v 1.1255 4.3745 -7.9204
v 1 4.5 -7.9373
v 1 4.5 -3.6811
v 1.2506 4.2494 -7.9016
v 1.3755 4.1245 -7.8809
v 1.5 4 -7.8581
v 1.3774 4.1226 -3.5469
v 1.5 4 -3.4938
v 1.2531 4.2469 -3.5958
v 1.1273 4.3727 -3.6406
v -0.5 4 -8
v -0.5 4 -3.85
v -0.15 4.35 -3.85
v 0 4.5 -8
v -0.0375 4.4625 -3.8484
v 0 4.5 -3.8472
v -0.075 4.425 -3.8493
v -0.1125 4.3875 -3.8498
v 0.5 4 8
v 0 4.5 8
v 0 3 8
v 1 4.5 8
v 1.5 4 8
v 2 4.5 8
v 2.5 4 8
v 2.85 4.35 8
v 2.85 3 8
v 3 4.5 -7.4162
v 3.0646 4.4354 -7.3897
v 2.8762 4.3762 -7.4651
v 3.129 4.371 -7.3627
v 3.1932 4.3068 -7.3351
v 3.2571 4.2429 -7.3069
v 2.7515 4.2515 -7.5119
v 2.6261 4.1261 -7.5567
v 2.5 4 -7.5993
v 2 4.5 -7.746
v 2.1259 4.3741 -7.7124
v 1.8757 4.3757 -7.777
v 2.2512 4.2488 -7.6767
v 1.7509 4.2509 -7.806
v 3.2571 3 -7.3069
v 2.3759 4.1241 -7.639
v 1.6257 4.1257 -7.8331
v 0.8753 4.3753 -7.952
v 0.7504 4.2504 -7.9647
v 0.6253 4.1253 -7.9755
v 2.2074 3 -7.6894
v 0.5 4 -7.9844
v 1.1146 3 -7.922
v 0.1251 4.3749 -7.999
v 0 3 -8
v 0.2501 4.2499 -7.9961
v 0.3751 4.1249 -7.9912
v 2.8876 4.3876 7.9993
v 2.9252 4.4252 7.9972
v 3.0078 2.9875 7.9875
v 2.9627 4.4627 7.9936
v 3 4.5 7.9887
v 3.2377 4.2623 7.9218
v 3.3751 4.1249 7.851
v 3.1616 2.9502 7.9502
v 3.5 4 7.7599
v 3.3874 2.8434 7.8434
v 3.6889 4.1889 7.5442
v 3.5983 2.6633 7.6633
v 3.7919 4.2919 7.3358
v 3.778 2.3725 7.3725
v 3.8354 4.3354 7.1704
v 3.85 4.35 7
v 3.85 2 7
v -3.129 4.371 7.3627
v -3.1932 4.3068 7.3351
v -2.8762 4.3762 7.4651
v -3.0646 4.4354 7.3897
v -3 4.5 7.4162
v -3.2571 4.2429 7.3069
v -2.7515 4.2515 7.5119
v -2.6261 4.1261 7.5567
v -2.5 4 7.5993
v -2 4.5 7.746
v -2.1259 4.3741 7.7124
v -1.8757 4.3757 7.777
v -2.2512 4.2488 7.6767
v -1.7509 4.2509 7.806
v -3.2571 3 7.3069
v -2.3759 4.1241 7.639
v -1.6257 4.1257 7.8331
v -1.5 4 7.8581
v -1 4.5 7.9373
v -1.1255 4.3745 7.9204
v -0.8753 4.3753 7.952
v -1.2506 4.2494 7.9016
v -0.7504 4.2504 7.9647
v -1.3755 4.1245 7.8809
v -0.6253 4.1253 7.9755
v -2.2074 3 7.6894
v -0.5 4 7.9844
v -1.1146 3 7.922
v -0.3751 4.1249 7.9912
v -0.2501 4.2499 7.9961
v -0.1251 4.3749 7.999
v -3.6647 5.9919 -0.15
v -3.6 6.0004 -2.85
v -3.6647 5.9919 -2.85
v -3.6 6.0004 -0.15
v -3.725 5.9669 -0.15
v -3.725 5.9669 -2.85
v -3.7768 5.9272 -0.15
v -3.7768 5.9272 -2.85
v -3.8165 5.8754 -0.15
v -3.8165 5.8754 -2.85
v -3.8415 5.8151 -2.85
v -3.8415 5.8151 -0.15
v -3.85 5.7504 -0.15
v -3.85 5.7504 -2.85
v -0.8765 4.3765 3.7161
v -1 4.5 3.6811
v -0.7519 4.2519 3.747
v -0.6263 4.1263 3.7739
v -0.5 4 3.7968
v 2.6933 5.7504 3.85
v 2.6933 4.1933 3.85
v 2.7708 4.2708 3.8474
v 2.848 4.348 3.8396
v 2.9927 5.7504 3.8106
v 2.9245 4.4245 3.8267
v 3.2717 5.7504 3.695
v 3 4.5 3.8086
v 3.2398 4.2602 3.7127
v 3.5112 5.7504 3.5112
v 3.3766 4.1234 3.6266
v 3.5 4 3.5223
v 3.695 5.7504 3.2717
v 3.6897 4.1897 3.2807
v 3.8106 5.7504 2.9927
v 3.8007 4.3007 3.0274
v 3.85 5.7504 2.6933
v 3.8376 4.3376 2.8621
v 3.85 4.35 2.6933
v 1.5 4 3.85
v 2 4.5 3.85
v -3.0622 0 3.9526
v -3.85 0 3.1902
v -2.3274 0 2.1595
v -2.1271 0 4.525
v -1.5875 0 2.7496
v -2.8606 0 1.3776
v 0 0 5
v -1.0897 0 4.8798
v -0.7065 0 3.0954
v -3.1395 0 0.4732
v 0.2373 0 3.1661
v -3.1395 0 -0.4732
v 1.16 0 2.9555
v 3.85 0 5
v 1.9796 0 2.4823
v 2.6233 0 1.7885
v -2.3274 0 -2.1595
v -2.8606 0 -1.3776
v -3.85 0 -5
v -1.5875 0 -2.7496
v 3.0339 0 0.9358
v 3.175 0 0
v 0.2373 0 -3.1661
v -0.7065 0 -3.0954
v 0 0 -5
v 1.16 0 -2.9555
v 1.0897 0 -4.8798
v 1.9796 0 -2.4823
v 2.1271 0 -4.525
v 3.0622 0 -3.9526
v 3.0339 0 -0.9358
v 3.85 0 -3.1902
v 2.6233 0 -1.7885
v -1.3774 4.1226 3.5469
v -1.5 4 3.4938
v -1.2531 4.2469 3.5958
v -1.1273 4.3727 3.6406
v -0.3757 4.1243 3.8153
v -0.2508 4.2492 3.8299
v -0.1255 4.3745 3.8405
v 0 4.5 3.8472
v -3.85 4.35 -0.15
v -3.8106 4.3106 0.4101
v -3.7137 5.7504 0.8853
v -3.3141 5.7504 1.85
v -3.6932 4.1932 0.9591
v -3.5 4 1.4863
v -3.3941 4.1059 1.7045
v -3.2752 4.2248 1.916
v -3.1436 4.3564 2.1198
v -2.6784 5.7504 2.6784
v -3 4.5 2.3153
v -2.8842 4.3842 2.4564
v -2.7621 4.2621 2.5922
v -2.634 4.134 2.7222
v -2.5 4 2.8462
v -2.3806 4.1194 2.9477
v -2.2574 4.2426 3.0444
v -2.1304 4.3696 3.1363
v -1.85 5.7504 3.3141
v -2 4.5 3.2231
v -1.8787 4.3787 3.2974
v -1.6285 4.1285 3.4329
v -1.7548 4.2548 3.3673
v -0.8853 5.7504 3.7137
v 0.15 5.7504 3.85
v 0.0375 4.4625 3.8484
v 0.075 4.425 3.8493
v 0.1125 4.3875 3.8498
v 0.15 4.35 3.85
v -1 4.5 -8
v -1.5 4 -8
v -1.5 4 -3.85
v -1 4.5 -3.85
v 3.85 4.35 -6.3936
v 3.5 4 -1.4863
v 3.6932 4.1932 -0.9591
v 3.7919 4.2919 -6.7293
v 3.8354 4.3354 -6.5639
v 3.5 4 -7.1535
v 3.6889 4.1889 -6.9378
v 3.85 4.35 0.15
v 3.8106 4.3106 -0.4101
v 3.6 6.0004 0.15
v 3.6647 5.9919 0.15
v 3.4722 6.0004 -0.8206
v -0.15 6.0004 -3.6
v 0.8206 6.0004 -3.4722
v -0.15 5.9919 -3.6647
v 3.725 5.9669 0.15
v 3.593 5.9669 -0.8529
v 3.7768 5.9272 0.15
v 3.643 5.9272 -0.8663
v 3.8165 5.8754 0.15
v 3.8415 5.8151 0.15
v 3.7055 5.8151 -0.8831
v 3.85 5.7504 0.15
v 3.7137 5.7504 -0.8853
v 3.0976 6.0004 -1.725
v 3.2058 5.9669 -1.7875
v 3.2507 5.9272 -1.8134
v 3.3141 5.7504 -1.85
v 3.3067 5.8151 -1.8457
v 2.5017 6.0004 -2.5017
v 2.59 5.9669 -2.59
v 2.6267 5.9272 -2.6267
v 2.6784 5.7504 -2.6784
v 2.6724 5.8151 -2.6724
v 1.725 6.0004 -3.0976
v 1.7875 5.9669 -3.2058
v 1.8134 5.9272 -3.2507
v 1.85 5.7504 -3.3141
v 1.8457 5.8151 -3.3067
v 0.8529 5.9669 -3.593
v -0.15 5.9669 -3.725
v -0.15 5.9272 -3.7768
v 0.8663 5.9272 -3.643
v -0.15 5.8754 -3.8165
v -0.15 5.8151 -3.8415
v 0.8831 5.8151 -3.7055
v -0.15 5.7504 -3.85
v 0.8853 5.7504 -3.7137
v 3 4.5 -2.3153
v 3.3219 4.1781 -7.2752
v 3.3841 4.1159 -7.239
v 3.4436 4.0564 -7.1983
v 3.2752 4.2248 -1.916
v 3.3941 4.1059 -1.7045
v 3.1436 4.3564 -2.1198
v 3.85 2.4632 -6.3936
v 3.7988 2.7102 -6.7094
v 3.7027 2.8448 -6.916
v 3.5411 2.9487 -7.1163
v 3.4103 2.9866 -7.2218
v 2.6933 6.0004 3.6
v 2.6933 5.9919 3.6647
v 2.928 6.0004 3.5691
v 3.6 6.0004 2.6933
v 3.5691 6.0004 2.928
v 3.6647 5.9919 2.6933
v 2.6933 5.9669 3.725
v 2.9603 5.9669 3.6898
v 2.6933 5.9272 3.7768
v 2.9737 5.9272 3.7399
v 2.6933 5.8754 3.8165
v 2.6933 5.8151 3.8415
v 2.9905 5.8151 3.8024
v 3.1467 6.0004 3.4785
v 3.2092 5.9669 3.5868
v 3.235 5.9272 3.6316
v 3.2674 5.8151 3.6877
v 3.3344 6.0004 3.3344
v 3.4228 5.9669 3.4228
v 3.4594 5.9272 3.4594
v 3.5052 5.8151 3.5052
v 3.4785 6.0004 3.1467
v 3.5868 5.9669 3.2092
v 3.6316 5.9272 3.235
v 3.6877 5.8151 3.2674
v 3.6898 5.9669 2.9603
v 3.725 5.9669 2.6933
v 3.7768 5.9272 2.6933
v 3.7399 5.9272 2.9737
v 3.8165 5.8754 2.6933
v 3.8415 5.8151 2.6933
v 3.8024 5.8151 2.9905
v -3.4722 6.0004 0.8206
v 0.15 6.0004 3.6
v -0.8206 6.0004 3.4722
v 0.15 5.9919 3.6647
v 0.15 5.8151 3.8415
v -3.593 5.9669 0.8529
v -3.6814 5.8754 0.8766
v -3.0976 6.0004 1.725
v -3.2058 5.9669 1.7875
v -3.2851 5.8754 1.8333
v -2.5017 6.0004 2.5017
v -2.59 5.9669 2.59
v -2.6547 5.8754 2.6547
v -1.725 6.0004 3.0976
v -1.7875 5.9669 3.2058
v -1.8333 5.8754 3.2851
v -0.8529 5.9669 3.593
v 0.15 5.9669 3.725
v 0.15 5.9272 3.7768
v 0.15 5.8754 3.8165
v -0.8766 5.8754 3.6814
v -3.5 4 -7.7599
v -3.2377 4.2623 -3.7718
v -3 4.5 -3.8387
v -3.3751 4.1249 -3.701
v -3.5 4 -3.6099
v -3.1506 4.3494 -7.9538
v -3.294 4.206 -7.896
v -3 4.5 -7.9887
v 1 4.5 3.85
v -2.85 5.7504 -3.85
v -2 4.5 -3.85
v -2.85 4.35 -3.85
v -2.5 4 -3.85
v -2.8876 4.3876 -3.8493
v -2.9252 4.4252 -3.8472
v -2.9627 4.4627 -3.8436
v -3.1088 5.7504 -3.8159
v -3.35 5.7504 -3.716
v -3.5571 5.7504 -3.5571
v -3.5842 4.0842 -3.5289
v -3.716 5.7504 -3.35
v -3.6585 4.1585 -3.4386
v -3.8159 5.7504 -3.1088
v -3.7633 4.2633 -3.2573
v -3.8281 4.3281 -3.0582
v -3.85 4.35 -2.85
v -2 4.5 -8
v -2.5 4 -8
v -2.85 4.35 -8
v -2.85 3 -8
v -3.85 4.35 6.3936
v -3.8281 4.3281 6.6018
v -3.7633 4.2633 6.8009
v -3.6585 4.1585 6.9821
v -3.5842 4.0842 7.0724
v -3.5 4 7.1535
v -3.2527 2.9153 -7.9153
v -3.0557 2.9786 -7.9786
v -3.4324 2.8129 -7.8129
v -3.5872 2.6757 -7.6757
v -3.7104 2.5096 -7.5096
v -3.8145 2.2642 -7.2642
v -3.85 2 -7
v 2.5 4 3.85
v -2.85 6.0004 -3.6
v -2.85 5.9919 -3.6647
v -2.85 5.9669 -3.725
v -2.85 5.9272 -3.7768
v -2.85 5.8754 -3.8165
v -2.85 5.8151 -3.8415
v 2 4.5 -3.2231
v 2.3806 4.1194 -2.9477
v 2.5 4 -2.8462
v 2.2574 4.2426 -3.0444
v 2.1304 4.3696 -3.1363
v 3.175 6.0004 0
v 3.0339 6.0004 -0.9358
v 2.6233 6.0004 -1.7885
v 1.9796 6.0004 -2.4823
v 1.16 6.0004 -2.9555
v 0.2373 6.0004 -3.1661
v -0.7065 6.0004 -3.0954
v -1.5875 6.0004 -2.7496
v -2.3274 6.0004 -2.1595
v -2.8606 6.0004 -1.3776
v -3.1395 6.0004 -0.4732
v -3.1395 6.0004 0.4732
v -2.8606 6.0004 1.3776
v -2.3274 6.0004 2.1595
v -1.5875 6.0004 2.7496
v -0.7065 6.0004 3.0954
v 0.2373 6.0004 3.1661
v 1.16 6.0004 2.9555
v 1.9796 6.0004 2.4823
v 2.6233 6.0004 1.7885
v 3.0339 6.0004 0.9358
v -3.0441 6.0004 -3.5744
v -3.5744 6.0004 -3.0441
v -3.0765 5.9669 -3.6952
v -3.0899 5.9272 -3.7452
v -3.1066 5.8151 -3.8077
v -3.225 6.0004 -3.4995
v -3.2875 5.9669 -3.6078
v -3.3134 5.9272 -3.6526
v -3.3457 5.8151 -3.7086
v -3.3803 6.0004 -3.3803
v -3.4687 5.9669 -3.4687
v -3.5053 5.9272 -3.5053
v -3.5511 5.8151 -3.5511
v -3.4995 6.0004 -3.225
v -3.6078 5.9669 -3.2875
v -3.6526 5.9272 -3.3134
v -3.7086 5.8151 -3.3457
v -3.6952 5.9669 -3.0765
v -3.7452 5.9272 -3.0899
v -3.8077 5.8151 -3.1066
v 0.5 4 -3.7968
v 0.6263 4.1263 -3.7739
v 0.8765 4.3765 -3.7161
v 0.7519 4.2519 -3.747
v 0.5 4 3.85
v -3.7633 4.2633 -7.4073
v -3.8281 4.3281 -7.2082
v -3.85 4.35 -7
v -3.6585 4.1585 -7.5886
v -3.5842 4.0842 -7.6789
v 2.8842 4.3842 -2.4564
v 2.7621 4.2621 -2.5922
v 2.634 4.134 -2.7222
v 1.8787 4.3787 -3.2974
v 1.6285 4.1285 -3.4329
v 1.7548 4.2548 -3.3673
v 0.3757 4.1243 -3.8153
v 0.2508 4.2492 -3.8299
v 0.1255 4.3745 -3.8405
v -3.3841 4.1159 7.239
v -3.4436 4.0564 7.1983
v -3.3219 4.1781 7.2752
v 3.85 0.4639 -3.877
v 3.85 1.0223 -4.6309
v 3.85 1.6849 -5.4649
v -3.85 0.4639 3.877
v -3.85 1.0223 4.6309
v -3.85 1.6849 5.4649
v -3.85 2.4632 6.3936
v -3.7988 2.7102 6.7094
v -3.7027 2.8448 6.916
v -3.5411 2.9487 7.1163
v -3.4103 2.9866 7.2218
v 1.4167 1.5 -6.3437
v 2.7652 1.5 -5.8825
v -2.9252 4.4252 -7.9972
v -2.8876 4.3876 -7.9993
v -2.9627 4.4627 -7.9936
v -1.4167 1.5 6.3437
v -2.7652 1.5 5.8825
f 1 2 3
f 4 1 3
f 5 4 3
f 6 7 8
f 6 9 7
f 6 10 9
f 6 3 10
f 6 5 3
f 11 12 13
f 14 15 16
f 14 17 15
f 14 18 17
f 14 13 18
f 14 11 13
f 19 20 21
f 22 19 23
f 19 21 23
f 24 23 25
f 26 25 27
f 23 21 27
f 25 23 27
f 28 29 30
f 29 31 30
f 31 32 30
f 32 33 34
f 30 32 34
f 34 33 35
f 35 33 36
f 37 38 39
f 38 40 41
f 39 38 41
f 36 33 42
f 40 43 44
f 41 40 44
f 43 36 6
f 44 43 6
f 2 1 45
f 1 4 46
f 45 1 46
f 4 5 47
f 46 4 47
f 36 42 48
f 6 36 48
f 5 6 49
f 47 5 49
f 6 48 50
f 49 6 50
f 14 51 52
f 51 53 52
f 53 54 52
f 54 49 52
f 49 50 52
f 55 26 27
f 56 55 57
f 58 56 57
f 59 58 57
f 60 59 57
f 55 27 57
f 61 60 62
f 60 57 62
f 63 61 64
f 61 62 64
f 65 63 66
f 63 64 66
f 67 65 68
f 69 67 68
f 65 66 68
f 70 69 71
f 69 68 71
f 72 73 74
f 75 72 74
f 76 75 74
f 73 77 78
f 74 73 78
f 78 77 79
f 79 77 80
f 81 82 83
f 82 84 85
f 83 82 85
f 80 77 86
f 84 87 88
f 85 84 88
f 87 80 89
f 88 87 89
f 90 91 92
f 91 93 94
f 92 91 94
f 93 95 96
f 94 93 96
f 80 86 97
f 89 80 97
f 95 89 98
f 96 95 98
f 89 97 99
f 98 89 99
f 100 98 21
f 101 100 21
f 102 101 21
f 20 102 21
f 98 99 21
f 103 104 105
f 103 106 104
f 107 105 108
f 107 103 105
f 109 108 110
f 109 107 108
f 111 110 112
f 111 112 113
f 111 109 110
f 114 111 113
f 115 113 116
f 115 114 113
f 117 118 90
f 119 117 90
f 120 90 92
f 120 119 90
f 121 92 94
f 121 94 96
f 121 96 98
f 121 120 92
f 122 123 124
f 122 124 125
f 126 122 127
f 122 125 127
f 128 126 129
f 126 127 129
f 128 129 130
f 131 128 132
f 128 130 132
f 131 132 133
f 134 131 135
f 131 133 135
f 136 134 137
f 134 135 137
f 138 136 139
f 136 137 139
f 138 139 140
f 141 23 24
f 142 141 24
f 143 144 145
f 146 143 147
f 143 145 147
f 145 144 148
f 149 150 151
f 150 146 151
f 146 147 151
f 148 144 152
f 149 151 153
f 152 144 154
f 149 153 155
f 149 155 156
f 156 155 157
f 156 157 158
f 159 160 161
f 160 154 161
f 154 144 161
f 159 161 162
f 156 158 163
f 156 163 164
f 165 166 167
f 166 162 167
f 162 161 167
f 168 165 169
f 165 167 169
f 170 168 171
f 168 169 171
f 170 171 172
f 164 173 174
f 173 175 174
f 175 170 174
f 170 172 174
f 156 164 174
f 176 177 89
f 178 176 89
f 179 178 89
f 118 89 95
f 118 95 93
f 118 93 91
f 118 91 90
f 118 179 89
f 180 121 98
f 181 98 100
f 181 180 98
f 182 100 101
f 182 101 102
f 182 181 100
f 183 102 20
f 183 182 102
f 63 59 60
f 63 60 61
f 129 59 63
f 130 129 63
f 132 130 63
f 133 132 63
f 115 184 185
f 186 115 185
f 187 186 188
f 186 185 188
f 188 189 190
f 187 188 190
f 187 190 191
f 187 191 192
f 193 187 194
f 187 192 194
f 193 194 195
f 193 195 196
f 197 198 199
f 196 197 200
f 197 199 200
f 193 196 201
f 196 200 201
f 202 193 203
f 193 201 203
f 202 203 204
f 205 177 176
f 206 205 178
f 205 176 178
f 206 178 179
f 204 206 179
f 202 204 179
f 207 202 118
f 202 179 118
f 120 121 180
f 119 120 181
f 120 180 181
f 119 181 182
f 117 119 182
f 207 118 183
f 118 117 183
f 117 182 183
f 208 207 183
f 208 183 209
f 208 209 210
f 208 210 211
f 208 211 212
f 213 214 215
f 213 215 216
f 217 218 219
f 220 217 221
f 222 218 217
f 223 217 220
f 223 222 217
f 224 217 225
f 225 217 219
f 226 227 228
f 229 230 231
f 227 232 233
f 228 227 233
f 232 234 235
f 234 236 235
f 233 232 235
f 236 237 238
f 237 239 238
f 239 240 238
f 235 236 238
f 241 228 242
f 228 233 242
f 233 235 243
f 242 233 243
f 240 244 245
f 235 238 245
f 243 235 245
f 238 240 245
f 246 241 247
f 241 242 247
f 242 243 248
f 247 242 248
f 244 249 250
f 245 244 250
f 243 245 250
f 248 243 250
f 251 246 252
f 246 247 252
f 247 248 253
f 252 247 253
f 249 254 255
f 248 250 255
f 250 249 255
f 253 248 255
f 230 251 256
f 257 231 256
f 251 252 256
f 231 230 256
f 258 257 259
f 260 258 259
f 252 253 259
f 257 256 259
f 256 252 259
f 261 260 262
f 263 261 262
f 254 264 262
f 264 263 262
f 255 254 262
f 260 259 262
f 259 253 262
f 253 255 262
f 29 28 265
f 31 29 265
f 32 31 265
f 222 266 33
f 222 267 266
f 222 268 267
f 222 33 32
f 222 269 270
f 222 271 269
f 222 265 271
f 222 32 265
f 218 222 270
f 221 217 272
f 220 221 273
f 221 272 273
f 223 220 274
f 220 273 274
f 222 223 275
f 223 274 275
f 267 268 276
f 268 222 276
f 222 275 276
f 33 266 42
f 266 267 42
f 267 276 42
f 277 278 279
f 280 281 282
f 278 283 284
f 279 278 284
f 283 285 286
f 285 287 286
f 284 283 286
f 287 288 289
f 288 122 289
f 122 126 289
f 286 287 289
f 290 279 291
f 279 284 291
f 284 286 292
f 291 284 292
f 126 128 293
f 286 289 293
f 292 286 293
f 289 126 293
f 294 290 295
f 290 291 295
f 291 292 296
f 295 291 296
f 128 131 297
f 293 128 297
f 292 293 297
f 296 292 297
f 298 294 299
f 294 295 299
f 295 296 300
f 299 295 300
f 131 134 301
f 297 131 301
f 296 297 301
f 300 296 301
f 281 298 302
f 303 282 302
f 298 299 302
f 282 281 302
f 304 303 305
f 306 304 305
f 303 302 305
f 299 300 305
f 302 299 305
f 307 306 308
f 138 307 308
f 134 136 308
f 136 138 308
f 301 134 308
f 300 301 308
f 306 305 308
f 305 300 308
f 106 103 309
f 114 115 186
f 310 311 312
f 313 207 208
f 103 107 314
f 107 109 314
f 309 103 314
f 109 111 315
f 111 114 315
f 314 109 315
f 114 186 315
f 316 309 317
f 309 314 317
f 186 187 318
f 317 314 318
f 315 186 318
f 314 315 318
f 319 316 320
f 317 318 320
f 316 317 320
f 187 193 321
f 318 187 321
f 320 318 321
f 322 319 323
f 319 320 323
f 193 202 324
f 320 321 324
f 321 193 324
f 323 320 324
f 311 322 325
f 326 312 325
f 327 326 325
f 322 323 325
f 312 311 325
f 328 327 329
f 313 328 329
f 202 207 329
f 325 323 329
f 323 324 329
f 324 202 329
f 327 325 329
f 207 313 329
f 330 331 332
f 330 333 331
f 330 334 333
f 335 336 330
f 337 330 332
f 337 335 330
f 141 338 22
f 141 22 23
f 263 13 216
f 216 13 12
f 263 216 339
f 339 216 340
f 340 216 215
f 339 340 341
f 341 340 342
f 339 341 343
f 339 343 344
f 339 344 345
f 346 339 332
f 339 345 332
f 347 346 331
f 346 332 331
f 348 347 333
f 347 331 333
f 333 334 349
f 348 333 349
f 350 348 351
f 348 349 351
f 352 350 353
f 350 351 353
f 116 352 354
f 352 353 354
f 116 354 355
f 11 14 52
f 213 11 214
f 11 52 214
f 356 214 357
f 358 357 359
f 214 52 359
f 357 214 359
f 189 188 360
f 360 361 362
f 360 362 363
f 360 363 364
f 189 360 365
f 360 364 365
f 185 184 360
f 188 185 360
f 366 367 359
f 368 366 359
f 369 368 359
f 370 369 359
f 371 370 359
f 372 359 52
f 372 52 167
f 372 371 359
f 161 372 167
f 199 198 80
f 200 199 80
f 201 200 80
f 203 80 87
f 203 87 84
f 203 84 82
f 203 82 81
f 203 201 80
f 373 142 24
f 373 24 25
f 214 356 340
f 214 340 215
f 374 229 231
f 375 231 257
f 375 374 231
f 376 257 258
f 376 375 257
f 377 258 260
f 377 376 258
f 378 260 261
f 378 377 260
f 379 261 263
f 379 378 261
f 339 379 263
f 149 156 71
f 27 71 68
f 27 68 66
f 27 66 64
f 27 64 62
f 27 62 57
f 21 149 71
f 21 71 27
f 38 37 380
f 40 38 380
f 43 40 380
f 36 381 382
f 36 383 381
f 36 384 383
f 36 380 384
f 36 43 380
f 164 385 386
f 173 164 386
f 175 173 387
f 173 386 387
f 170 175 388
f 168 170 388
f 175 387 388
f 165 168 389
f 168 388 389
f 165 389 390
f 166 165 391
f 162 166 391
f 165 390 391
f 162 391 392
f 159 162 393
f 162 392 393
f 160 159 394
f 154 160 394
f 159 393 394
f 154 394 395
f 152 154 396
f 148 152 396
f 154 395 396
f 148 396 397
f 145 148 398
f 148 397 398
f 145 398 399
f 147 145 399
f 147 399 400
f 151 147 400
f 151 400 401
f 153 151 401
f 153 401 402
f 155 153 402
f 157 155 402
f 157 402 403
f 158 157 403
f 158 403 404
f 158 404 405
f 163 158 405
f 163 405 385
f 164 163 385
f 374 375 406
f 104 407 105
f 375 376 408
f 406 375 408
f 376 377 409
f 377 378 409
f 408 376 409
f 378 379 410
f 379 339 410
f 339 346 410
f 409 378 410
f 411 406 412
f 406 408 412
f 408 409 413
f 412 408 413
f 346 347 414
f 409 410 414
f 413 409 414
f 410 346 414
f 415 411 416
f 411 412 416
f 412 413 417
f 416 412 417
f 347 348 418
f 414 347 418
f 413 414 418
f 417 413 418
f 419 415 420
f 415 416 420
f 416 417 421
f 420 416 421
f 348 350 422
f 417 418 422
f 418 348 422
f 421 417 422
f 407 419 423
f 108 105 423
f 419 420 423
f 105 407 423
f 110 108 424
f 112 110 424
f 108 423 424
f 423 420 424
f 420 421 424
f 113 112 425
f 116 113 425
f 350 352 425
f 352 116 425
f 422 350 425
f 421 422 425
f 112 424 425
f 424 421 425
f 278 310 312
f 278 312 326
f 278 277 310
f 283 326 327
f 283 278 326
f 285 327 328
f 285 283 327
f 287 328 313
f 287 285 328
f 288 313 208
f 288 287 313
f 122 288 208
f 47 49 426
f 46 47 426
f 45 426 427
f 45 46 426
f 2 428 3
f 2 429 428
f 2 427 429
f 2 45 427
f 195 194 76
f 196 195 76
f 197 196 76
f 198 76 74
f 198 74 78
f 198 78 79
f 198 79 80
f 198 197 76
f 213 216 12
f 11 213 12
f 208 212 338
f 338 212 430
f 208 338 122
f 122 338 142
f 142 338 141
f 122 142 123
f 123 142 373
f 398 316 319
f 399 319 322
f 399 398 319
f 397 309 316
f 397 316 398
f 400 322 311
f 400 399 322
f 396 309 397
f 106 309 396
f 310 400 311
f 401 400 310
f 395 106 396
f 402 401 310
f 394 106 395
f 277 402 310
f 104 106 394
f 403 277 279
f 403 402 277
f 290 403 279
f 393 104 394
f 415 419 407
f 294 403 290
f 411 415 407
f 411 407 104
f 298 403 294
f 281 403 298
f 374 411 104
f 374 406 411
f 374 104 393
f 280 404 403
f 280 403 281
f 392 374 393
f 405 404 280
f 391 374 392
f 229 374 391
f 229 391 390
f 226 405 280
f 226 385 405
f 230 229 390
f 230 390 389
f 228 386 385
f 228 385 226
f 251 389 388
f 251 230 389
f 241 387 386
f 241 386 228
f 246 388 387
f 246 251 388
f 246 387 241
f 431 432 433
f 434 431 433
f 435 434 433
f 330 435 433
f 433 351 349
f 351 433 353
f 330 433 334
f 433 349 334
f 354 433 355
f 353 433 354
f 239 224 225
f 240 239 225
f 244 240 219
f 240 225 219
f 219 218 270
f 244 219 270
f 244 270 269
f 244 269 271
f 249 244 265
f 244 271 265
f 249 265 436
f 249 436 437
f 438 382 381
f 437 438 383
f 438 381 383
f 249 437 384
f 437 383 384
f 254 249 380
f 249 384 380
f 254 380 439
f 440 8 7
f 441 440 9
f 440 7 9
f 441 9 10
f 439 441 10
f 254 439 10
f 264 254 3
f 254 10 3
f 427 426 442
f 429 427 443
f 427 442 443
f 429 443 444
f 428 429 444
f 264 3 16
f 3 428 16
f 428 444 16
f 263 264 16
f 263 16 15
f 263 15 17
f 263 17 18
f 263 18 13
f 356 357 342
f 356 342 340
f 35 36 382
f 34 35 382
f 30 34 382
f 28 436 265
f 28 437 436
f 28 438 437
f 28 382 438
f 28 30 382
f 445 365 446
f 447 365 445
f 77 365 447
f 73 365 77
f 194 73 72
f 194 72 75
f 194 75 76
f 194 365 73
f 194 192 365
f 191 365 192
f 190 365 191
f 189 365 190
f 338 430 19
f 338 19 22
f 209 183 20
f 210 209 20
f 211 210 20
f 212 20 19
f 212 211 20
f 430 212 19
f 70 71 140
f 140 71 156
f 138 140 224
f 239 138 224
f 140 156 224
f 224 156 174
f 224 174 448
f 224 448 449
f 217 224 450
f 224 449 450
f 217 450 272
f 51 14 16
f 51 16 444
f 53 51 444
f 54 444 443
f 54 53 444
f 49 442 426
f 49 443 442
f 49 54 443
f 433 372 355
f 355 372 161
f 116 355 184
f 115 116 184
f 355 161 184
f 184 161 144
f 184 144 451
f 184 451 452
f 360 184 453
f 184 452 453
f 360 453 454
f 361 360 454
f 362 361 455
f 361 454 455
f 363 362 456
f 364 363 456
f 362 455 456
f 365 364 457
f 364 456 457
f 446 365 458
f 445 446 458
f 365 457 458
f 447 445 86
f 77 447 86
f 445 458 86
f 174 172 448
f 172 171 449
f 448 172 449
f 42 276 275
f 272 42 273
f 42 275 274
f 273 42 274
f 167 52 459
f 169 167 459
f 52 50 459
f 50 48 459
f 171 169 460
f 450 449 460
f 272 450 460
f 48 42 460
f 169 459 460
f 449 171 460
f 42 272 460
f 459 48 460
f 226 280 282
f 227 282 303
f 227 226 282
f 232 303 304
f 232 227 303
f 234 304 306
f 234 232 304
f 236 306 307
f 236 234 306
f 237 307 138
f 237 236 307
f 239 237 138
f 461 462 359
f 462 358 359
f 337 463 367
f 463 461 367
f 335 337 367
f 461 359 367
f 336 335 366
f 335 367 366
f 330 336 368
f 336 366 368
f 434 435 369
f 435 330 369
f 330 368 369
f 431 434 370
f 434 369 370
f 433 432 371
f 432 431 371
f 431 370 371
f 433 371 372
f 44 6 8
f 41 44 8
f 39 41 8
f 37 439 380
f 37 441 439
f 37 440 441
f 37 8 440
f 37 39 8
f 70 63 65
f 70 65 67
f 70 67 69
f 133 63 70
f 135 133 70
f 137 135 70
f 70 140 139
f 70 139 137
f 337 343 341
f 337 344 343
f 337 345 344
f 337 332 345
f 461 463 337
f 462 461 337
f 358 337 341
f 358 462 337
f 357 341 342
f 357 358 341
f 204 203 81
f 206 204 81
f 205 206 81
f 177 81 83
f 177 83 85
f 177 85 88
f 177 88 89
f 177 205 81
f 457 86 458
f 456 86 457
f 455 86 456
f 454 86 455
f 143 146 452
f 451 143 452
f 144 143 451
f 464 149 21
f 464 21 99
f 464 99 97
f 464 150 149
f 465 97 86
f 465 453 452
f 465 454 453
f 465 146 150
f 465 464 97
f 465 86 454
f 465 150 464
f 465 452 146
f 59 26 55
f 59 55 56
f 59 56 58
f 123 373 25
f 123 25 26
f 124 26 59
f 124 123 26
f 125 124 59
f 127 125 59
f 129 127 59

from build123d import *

# Parameters (mm, degrees)
EXTRUDE1_DEPTH          = 4.5
CUT_EXTRUDE1_DEPTH      = 8
CUT_EXTRUDE1_DEPTH_BACK = 8
EXTRUDE2_DEPTH          = 6.00039994
CUT_EXTRUDE2_DEPTH      = 4
CUT_EXTRUDE2_DEPTH_BACK = 4
CUT_REVOLVE1_ANGLE      = 60
CUT_REVOLVE2_ANGLE      = 60
SKETCH9_R               = 2.48793
CUT_EXTRUDE3_DEPTH      = 7.00040004
FILLET4_R               = 0.25
SKETCH10_R              = 2.48793
EXTRUDE3_DEPTH          = 6.0004
SKETCH12_R              = 3.175
CUT_EXTRUDE4_DEPTH      = 7.00040004


with BuildPart() as part:
    # Sketch1 → Extrude1 (new body)
    with BuildSketch(Plane(origin=(0, 0, 0), x_dir=(1, 0, 0), z_dir=(0, 1, 0))):
        with BuildLine():
            Line((0, -8), (2.85, -8))
            ThreePointArc((2.85, -8), (3.557106781, -7.707106781), (3.85, -7))
            Line((3.85, -7), (3.85, 6.393551439))
            ThreePointArc((3.85, 6.393551439), (3.688791661, 6.938003962), (3.2571429, 7.306915911))
            ThreePointArc((3.2571429, 7.306915911), (1.66503344, 7.824810774), (0, 8))
            Line((0, 8), (-2.85, 8))
            ThreePointArc((-2.85, 8), (-3.557106781, 7.707106781), (-3.85, 7))
            Line((-3.85, 7), (-3.85, -6.393551439))
            ThreePointArc((-3.85, -6.393551439), (-3.688791661, -6.938003962), (-3.2571429, -7.306915911))
            ThreePointArc((-3.2571429, -7.306915911), (-1.66503344, -7.824810774), (0, -8))
        make_face()
    extrude(amount=EXTRUDE1_DEPTH)

    # Sketch2 → Cut-Extrude1 (cut, two sides)
    with BuildSketch(Plane.XY) as cut_extrude1_sk:
        Polygon((-4, 4.5), (-3.5, 4), (-3, 4.5), (-2.5, 4), (-2, 4.5), (-1.5, 4), (-1, 4.5), (-0.5, 4), (0, 4.5), (0.5, 4), (1, 4.5), (1.5, 4), (2, 4.5), (2.5, 4), (3, 4.5), (3.5, 4), (4, 4.5), (4, 5.5), (-4, 5.5), align=None)
    extrude(amount=CUT_EXTRUDE1_DEPTH, mode=Mode.SUBTRACT)
    extrude(cut_extrude1_sk.sketch, amount=-CUT_EXTRUDE1_DEPTH_BACK, mode=Mode.SUBTRACT)

    # Sketch3 → Extrude2 (add)
    with BuildSketch(Plane(origin=(0, 0, 0), x_dir=(1, 0, 0), z_dir=(0, 1, 0))):
        with BuildLine():
            Line((0.15, -3.85), (2.693303618, -3.85))
            ThreePointArc((2.693303618, -3.85), (3.511211473, -3.511211473), (3.85, -2.693303618))
            Line((3.85, -2.693303618), (3.85, -0.15))
            ThreePointArc((3.85, -0.15), (2.678427125, 2.678427125), (-0.15, 3.85))
            Line((-0.15, 3.85), (-2.85, 3.85))
            ThreePointArc((-2.85, 3.85), (-3.557106781, 3.557106781), (-3.85, 2.85))
            Line((-3.85, 2.85), (-3.85, 0.15))
            ThreePointArc((-3.85, 0.15), (-2.678427125, -2.678427125), (0.15, -3.85))
        make_face()
    extrude(amount=EXTRUDE2_DEPTH)

    # Sketch4 → Cut-Extrude2 (cut, two sides)
    with BuildSketch(Plane(origin=(0, 0, 0), x_dir=(0, 0, -1), z_dir=(1, 0, 0))) as cut_extrude2_sk:
        Polygon((-9, -1), (9, -1), (9, 4), (5, 0), (-5, 0), (-9, 4), align=None)
    extrude(amount=CUT_EXTRUDE2_DEPTH, mode=Mode.SUBTRACT)
    extrude(cut_extrude2_sk.sketch, amount=-CUT_EXTRUDE2_DEPTH_BACK, mode=Mode.SUBTRACT)

    # Sketch5 → Cut-Revolve1 (revolve, cut)
    with BuildSketch(Plane(origin=(0, 0, 0), x_dir=(0, 0, -1), z_dir=(1, 0, 0))):
        Polygon((0, -1), (-9, -1), (-9, 3), (-8, 3), (-5, 0), (0, 0), align=None)
    revolve(axis=Axis((0, 3, 0), (0, -1, 0)), revolution_arc=CUT_REVOLVE1_ANGLE, mode=Mode.SUBTRACT)

    # Sketch6 → Cut-Revolve2 (revolve, cut)
    with BuildSketch(Plane(origin=(0, 0, 0), x_dir=(0, 0, -1), z_dir=(1, 0, 0))):
        Polygon((0, 0), (5, 0), (8, 3), (9, 3), (9, -1), (0, -1), align=None)
    revolve(axis=Axis((0, -1, 0), (0, -1, 0)), revolution_arc=CUT_REVOLVE2_ANGLE, mode=Mode.SUBTRACT)

    # Sketch9 → Cut-Extrude3 (cut, through all)
    with BuildSketch(Plane(origin=(0, 6.00039994, 0), x_dir=(1, 0, 0), z_dir=(0, 1, 0))):
        Circle(SKETCH9_R)
    extrude(amount=-CUT_EXTRUDE3_DEPTH, mode=Mode.SUBTRACT)

    # Fillet4
    fillet4_edges = [part.edges().sort_by_distance(p)[0] for p in [
        (-2.678427125, 6.00039994, 2.678427125),
        (1.421651809, 6.00039994, 3.85),
        (3.511211473, 6.00039994, 3.511211473),
        (3.85, 6.00039994, 1.421651809),
        (2.678427125, 6.00039994, -2.678427125),
        (-1.5, 6.00039994, -3.85),
        (-3.557106781, 6.00039994, -3.557106781),
        (-3.85, 6.00039994, -1.5),
    ]]
    fillet(fillet4_edges, radius=FILLET4_R)

    # Sketch10 → Extrude3 (add)
    with BuildSketch(Plane(origin=(0, 6.00039994, 0), x_dir=(1, 0, 0), z_dir=(0, 1, 0))):
        Circle(SKETCH10_R)
    extrude(amount=-EXTRUDE3_DEPTH)

    # Sketch12 → Cut-Extrude4 (cut, through all)
    with BuildSketch(Plane(origin=(0, 6.00039994, 0), x_dir=(1, 0, 0), z_dir=(0, 1, 0))):
        Circle(SKETCH12_R)
    extrude(amount=-CUT_EXTRUDE4_DEPTH, mode=Mode.SUBTRACT)


solid = part.part
